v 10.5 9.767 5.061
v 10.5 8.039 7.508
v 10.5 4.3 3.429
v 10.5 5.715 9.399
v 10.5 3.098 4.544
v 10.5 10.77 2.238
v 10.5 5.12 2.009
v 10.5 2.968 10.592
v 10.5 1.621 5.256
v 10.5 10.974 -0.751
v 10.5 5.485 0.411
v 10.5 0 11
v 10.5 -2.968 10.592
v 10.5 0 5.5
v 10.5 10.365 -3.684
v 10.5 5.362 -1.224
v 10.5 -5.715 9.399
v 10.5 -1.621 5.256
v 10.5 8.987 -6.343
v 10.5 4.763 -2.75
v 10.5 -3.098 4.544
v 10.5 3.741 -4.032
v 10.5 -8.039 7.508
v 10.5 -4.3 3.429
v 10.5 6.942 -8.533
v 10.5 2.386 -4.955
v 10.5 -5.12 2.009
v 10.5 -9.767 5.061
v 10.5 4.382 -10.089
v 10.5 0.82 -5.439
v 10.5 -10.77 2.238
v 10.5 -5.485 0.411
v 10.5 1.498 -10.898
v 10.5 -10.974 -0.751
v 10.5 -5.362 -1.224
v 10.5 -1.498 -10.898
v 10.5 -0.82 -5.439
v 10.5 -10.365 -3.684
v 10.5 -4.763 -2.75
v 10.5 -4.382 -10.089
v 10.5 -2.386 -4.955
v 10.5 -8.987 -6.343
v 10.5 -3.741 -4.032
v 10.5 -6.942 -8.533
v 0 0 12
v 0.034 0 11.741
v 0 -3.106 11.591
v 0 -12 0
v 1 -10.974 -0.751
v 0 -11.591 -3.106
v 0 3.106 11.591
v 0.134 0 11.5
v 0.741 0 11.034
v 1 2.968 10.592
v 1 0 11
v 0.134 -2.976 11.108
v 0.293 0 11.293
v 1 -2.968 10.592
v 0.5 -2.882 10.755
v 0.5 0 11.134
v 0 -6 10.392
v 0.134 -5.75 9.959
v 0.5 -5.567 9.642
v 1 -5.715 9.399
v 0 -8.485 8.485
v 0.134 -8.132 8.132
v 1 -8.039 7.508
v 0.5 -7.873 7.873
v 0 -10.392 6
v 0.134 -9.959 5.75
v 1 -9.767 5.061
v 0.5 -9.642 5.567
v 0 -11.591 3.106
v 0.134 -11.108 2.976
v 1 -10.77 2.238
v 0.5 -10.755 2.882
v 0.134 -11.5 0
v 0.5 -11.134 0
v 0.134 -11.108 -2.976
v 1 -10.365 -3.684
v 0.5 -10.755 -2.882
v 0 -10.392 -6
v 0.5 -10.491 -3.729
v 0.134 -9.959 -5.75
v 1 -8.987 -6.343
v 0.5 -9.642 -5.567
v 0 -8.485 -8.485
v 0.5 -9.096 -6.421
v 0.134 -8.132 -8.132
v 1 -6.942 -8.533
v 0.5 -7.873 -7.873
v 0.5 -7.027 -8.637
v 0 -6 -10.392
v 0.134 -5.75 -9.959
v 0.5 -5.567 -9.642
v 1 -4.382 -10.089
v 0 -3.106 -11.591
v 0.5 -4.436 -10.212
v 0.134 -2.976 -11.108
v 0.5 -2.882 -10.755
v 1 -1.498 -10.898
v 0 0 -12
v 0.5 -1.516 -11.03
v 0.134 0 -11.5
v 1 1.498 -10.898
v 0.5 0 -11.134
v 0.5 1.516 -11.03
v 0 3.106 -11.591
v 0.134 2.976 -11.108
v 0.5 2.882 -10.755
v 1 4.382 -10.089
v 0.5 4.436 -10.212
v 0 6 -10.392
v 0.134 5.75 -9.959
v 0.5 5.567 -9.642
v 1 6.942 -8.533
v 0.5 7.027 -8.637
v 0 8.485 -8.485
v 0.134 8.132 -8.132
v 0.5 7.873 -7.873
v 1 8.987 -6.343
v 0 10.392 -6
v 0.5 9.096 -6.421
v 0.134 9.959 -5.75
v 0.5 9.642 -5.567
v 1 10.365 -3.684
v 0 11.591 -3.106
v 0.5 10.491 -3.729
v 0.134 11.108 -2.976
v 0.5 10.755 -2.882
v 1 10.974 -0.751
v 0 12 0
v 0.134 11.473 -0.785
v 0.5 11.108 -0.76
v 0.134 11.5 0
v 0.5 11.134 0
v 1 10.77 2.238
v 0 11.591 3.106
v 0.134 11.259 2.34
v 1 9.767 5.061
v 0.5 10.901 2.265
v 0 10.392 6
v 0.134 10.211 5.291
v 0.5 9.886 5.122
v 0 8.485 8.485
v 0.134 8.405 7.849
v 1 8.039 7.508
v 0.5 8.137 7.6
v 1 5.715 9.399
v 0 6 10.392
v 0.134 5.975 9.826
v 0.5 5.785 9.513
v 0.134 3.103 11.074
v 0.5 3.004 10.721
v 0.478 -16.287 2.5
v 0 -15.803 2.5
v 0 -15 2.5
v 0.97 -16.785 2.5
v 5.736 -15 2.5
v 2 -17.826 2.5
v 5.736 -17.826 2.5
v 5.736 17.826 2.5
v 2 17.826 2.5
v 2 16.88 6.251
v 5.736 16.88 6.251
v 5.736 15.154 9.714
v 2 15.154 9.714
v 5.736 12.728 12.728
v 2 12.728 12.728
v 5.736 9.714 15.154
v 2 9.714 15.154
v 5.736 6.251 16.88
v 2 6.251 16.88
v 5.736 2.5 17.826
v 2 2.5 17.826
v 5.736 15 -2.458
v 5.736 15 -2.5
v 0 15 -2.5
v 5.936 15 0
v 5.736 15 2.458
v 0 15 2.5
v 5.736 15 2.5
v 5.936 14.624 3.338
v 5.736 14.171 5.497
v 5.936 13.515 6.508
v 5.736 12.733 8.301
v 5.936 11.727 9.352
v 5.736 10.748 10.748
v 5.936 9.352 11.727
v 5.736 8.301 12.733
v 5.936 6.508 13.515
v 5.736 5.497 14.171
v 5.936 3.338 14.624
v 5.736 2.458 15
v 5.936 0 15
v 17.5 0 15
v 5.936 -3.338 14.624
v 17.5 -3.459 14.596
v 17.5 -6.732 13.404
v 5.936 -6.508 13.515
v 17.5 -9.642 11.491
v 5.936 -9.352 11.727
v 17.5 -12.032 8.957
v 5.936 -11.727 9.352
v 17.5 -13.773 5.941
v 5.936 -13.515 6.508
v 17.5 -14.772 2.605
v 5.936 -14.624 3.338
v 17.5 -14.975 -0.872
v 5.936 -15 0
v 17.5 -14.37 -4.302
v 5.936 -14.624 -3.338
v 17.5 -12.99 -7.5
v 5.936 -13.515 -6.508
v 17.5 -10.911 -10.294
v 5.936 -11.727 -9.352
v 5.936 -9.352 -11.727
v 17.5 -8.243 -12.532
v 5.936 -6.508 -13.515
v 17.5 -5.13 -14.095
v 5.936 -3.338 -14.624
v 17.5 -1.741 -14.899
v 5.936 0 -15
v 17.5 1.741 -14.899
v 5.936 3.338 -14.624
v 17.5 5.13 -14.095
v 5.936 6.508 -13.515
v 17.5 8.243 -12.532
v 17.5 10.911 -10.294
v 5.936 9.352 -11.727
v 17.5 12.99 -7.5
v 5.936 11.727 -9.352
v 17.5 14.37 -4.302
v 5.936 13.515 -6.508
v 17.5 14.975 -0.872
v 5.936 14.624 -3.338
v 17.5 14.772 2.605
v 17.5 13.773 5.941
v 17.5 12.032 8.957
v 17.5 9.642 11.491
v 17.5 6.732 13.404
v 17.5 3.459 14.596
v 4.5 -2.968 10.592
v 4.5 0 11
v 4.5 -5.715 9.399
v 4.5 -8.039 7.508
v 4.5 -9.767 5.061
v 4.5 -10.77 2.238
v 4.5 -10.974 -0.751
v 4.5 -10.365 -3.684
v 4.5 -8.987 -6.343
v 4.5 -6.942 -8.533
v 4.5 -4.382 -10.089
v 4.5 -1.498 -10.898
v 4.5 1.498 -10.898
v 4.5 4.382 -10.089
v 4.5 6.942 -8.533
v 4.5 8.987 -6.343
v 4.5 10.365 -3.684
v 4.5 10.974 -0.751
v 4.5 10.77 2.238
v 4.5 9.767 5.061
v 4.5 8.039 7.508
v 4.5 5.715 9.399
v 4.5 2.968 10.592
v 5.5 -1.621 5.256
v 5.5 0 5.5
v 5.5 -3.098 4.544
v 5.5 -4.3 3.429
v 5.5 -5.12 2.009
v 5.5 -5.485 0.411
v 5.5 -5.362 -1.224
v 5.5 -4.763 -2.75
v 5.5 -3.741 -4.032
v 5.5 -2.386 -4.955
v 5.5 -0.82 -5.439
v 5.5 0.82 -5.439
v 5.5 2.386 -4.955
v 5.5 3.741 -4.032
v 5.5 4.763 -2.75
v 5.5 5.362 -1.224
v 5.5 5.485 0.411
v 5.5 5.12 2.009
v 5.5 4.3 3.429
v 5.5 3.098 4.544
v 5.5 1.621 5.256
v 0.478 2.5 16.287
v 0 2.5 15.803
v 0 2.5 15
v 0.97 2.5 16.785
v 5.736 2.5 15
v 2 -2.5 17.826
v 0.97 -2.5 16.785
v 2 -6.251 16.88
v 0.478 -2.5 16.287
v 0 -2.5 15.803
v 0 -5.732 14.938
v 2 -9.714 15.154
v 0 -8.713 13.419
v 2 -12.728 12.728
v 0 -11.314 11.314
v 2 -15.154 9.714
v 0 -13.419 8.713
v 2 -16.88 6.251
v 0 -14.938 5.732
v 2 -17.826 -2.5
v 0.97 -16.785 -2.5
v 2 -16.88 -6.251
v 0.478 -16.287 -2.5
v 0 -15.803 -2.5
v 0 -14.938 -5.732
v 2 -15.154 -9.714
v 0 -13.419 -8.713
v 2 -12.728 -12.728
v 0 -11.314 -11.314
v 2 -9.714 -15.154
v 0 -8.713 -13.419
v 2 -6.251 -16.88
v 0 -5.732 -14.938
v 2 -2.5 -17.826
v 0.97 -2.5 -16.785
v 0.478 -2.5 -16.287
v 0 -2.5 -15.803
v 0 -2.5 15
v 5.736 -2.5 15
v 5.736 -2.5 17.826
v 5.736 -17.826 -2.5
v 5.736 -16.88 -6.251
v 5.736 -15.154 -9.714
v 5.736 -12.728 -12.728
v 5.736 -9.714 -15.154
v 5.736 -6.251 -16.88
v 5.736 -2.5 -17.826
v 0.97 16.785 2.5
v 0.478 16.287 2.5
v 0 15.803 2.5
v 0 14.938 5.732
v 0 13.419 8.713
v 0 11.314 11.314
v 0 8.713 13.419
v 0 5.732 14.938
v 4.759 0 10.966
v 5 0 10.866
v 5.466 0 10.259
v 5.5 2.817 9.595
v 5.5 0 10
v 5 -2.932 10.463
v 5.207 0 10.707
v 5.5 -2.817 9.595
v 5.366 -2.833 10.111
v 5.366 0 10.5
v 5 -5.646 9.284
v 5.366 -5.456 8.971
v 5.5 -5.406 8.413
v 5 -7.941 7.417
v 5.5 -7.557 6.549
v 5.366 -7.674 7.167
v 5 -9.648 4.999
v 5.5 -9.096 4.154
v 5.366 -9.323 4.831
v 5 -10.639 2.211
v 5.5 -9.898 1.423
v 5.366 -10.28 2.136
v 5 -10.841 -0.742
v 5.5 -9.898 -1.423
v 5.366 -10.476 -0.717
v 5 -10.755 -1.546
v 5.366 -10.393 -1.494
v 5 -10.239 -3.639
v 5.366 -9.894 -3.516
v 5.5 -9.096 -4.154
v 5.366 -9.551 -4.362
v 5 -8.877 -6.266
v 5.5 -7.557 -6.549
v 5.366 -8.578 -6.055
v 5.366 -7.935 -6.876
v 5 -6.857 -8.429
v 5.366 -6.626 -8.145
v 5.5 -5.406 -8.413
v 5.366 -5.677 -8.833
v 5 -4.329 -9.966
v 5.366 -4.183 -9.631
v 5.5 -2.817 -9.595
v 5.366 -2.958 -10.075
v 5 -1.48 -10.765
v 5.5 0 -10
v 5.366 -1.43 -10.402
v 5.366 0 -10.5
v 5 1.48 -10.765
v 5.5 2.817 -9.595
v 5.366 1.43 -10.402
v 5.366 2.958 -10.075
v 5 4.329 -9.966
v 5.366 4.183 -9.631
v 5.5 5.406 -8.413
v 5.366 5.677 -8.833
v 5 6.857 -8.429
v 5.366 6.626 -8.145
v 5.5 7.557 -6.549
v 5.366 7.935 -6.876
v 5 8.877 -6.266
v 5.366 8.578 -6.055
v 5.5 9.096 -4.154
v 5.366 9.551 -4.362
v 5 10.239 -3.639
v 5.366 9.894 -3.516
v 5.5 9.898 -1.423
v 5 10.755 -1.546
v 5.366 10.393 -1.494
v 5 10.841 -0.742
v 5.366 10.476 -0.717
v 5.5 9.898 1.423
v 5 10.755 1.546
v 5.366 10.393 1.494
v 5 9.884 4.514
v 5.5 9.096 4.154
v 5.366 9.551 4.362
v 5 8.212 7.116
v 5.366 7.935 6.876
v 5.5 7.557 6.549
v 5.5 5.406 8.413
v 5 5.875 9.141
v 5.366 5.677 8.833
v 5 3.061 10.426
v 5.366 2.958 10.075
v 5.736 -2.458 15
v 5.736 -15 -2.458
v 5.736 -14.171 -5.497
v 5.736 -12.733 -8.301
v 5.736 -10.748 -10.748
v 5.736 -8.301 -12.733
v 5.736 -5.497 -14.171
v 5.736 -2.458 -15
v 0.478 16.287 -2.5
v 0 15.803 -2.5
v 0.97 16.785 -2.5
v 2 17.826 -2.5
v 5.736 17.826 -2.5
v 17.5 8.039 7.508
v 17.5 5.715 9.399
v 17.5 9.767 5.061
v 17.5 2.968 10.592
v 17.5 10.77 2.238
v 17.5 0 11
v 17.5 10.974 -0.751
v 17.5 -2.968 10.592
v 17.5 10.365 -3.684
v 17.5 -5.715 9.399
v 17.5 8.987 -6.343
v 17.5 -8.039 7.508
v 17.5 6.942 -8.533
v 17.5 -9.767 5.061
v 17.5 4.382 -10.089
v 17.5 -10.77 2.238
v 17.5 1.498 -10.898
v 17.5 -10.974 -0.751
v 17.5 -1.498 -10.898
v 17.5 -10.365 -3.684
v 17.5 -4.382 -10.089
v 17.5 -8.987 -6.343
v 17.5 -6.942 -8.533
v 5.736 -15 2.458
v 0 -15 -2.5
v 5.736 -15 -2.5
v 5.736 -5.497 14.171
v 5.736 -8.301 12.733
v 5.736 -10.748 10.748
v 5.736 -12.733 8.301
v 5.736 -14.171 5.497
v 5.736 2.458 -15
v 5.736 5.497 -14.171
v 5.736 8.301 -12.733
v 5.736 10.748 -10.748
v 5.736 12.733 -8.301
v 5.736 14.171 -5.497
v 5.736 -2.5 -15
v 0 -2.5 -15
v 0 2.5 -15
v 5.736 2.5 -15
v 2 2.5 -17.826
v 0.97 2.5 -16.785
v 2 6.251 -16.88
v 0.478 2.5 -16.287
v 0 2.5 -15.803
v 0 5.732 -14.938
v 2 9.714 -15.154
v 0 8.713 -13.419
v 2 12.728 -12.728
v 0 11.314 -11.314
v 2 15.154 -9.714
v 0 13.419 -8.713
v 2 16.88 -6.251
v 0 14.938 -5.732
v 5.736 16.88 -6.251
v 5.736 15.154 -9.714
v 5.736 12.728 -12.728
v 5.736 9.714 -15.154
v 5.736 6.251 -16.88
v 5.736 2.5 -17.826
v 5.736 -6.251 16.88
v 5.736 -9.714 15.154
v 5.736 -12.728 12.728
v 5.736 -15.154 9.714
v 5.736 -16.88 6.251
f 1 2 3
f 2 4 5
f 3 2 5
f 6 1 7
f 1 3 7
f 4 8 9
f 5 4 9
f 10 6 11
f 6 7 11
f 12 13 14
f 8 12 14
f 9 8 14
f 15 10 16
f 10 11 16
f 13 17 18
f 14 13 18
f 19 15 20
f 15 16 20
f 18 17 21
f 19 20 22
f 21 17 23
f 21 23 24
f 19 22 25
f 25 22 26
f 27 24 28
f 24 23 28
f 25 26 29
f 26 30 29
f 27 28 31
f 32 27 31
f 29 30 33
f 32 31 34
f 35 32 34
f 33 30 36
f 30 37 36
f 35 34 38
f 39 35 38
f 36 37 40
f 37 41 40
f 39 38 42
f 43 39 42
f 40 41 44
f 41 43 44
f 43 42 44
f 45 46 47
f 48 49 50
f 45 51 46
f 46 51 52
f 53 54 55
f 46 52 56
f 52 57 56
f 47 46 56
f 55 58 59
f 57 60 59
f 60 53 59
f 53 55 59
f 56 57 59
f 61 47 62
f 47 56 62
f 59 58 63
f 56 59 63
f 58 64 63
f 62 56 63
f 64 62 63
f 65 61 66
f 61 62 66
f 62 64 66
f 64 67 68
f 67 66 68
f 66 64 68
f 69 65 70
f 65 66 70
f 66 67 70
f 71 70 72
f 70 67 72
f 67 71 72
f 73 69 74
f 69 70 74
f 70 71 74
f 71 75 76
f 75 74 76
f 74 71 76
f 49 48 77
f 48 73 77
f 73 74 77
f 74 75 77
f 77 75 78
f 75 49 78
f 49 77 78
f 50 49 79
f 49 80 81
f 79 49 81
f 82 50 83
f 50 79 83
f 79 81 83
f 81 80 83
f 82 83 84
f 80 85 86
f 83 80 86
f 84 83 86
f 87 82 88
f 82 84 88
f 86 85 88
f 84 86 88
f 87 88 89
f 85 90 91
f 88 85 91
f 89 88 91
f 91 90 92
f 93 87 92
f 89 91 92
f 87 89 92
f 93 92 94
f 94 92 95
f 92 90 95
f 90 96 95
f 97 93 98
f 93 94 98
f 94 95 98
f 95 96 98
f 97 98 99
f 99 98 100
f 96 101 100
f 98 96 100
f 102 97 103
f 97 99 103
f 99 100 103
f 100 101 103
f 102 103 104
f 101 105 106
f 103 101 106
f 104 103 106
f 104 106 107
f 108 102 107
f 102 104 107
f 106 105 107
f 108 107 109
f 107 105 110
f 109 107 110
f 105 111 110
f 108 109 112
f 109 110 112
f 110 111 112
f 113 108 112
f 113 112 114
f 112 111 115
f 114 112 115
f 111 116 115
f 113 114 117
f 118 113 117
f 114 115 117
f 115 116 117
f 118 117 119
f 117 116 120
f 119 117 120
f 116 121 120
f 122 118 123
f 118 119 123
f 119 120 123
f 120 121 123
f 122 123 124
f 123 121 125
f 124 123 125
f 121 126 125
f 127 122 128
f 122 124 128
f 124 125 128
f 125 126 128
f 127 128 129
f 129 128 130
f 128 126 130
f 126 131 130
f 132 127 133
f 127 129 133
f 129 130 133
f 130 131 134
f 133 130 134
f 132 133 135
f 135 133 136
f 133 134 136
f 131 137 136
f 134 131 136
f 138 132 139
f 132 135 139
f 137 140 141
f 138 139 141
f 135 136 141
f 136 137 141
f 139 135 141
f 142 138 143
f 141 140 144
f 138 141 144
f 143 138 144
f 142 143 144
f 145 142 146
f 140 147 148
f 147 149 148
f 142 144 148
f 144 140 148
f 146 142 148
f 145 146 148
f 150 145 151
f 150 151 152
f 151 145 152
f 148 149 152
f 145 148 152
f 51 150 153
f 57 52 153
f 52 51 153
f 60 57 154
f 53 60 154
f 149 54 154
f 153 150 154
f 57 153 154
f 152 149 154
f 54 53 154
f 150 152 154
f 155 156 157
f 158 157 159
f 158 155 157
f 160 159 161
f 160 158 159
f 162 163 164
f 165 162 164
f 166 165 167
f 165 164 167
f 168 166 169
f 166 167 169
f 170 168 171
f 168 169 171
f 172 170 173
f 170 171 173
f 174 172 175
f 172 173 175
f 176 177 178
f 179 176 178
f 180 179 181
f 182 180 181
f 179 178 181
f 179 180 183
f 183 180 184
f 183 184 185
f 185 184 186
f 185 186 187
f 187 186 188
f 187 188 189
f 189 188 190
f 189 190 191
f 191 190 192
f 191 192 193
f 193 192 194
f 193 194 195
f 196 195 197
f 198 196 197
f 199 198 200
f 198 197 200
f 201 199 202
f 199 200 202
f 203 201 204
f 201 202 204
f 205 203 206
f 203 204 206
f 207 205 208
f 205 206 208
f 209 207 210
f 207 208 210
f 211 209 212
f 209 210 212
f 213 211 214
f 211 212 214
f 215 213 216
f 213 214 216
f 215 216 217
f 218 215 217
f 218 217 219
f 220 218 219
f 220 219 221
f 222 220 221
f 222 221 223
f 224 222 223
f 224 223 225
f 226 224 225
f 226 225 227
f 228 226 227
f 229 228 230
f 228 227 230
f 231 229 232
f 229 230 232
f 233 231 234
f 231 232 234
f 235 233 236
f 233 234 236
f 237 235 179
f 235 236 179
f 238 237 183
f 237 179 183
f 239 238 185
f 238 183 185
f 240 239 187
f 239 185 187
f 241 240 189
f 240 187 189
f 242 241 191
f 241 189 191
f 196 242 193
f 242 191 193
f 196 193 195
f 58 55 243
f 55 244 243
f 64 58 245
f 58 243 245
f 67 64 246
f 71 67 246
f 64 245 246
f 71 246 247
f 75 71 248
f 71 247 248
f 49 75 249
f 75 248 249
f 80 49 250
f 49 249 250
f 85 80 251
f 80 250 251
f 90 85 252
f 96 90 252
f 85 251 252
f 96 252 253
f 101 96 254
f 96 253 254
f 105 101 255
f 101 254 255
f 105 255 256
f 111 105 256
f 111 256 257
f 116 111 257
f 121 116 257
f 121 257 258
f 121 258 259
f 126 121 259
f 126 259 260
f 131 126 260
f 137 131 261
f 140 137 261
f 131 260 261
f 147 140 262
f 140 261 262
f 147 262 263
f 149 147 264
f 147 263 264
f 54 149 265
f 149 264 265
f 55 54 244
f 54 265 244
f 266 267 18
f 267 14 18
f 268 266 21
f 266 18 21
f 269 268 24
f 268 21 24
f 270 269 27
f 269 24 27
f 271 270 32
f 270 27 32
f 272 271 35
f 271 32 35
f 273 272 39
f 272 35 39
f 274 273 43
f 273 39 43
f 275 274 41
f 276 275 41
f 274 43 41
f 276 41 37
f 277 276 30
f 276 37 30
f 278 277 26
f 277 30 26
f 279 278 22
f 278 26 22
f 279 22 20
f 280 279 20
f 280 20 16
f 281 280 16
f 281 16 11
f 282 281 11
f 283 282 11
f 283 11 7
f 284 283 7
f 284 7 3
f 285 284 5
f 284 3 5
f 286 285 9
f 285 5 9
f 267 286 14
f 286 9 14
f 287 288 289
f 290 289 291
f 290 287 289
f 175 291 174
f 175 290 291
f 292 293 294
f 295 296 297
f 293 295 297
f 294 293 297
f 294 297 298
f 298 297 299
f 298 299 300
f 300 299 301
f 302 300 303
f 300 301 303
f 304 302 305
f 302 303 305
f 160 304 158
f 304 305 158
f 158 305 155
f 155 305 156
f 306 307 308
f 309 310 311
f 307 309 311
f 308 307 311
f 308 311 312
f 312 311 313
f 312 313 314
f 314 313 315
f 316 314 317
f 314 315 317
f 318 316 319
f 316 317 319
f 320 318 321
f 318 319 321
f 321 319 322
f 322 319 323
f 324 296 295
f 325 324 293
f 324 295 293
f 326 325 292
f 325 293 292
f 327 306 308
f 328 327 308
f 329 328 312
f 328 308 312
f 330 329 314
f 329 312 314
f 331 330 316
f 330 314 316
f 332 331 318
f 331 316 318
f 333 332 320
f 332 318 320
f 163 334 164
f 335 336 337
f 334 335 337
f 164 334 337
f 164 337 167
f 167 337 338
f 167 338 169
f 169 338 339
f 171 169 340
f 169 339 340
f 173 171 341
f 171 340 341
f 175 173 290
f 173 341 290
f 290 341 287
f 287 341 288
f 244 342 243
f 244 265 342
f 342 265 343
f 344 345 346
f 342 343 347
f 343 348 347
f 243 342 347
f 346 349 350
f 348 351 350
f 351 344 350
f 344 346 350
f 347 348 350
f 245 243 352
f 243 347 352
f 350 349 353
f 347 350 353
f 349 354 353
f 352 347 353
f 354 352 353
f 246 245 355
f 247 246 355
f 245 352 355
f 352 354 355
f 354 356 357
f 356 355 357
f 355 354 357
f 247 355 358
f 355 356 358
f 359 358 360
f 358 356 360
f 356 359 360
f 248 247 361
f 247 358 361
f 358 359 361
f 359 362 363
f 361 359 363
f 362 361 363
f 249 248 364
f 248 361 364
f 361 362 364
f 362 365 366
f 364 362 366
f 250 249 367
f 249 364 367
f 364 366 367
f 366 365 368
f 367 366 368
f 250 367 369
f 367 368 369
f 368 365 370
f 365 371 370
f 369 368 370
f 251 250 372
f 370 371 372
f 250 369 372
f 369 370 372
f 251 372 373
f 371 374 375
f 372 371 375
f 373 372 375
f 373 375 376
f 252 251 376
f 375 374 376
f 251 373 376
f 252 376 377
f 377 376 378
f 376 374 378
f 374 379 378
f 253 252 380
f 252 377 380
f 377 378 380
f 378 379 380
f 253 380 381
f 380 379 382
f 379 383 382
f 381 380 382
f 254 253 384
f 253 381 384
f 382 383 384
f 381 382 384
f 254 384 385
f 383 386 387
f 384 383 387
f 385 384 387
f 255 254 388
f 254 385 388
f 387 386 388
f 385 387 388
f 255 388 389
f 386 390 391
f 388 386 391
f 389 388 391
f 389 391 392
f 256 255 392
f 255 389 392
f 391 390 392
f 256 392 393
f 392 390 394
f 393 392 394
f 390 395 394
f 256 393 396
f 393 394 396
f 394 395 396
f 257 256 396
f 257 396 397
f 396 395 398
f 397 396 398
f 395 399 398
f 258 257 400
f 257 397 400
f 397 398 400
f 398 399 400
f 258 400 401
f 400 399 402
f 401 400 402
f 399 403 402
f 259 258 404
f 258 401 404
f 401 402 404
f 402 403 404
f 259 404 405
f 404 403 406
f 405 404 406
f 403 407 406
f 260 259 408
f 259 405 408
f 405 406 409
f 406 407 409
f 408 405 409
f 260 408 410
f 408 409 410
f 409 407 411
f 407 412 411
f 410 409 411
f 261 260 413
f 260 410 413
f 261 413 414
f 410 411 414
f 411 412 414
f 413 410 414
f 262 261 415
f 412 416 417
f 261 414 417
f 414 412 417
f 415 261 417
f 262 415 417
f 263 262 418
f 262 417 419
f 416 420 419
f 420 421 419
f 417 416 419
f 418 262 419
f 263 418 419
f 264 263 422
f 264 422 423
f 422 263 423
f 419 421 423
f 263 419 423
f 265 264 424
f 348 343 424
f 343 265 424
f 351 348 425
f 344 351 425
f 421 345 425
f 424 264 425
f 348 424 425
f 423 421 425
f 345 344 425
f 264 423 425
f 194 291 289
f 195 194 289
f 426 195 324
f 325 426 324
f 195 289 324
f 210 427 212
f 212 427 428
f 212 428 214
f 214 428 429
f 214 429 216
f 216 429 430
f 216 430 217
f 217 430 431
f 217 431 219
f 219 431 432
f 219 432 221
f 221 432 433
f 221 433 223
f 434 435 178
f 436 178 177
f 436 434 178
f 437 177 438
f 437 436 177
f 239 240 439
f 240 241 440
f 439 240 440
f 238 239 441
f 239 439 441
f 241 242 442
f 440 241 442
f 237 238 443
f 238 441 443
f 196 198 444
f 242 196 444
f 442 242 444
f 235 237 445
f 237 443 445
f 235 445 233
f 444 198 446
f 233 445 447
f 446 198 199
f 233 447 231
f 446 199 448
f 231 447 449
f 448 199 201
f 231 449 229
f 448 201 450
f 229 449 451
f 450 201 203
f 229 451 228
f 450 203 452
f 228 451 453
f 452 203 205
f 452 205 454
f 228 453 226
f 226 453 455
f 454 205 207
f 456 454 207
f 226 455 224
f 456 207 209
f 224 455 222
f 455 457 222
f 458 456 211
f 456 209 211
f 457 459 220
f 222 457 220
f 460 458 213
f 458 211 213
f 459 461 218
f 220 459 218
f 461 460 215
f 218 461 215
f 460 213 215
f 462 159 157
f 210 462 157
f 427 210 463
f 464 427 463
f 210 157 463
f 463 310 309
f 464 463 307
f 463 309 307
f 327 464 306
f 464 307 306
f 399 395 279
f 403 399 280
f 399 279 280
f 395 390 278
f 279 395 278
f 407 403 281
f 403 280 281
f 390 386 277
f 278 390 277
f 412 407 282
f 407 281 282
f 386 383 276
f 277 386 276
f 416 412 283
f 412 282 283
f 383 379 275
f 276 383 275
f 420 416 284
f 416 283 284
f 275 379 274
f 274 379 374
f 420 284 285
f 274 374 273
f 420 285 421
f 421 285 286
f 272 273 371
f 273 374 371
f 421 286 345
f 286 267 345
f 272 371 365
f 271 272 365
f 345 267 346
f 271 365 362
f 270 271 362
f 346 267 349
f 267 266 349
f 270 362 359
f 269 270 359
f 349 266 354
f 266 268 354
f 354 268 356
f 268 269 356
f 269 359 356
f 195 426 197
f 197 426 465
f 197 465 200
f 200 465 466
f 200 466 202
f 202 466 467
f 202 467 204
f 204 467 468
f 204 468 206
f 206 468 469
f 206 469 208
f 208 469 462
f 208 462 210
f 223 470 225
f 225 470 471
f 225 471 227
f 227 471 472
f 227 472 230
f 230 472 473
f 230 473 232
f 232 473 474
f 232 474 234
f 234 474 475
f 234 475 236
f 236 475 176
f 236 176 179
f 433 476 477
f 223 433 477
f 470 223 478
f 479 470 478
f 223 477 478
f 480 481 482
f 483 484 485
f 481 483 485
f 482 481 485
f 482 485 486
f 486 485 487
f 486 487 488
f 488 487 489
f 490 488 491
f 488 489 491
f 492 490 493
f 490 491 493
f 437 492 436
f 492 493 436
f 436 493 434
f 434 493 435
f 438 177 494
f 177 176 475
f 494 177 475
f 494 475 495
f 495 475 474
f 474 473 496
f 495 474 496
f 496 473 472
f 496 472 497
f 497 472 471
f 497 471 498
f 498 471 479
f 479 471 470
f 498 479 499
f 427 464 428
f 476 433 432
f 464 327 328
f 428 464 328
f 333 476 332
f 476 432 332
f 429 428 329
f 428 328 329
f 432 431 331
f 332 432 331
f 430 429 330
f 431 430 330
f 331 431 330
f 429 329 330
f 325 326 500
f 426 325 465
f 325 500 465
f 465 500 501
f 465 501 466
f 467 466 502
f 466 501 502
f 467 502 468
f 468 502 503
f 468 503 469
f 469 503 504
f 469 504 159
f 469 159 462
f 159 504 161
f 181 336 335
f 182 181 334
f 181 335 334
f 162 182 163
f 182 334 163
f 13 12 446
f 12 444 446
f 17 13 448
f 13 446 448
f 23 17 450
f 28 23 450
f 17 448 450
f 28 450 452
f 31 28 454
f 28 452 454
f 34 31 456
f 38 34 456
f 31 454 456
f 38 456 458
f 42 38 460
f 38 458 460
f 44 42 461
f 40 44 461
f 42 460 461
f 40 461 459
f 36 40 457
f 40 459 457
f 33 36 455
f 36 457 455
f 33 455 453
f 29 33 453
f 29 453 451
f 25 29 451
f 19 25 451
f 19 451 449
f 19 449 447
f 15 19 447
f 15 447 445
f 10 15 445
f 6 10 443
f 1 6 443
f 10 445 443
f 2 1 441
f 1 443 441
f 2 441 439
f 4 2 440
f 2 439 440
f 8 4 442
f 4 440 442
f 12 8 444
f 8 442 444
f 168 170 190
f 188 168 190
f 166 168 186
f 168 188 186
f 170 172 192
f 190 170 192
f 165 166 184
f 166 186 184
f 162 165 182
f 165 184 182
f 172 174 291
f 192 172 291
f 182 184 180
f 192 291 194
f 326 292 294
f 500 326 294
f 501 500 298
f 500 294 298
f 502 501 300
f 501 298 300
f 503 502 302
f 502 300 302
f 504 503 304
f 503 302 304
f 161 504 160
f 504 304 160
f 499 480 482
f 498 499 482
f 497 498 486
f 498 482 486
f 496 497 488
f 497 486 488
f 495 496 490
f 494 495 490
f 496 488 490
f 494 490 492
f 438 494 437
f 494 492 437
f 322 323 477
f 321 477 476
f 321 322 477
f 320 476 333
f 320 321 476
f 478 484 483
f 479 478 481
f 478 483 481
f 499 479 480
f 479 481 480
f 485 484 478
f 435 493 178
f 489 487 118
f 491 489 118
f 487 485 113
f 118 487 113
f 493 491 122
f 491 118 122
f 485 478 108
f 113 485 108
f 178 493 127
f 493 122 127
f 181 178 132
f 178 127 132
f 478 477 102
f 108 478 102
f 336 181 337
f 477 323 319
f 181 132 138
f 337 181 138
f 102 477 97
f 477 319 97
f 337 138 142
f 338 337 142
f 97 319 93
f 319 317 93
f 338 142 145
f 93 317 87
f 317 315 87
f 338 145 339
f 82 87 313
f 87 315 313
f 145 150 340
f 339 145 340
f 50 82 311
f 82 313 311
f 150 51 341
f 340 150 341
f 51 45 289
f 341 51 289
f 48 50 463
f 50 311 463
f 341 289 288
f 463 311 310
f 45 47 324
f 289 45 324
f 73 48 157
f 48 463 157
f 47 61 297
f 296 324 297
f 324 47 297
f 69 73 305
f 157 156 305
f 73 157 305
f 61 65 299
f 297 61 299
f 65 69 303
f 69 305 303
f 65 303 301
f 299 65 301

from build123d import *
from build123d.topology import SkipClean

# Parameters (mm, degrees)
SKETCH2_W          = 5
SKETCH2_H          = 3
CUT_EXTRUDE1_DEPTH = 31.890937182
CIRPATTERN3_COUNT  = 4


with BuildPart() as part:
    # Sketch1 → Revolve3 (revolve)
    with BuildSketch(Plane.XY, mode=Mode.PRIVATE) as revolve3_sk:
        with BuildLine():
            Line((5.5, 5.5), (10.5, 5.5))
            Line((10.5, 5.5), (10.5, 11))
            Line((10.5, 11), (17.5, 11))
            Line((17.5, 11), (17.5, 15))
            Line((17.5, 15), (5.935714286, 15))
            ThreePointArc((5.935714286, 15), (5.794292929, 15.058578644), (5.735714286, 15.2))
            Line((5.735714286, 15.2), (5.735714286, 18))
            Line((5.735714286, 18), (2, 18))
            Line((2, 18), (0, 16))
            Line((0, 16), (0, 12))
            ThreePointArc((0, 12), (0.292893219, 11.292893219), (1, 11))
            Line((1, 11), (4.5, 11))
            ThreePointArc((4.5, 11), (5.207106781, 10.707106781), (5.5, 10))
            Line((5.5, 10), (5.5, 5.5))
        make_face()
    revolve(revolve3_sk.sketch.rotate(Axis((0, 0, 0), (1, 0, 0)), 90), axis=Axis((0, 0, 0), (1, 0, 0)))

    # Sketch2 → Cut-Extrude1 (cut, symmetric)
    with SkipClean():  # the faces are left unmerged after this step: merging them gives an invalid solid
        with BuildSketch(Plane.ZY):
            with Locations((0, 16.5)):
                Rectangle(SKETCH2_W, SKETCH2_H)
        cut_extrude1 = extrude(amount=CUT_EXTRUDE1_DEPTH, both=True, mode=Mode.SUBTRACT)

    # CirPattern3: Cut-Extrude1 ×4 about axis
    cirpattern3_axis = Axis((0, 0, 0), (1, 0, 0))
    for i in range(1, CIRPATTERN3_COUNT):
        add(cut_extrude1.rotate(cirpattern3_axis, i * 360 / CIRPATTERN3_COUNT), mode=Mode.SUBTRACT)


solid = part.part
